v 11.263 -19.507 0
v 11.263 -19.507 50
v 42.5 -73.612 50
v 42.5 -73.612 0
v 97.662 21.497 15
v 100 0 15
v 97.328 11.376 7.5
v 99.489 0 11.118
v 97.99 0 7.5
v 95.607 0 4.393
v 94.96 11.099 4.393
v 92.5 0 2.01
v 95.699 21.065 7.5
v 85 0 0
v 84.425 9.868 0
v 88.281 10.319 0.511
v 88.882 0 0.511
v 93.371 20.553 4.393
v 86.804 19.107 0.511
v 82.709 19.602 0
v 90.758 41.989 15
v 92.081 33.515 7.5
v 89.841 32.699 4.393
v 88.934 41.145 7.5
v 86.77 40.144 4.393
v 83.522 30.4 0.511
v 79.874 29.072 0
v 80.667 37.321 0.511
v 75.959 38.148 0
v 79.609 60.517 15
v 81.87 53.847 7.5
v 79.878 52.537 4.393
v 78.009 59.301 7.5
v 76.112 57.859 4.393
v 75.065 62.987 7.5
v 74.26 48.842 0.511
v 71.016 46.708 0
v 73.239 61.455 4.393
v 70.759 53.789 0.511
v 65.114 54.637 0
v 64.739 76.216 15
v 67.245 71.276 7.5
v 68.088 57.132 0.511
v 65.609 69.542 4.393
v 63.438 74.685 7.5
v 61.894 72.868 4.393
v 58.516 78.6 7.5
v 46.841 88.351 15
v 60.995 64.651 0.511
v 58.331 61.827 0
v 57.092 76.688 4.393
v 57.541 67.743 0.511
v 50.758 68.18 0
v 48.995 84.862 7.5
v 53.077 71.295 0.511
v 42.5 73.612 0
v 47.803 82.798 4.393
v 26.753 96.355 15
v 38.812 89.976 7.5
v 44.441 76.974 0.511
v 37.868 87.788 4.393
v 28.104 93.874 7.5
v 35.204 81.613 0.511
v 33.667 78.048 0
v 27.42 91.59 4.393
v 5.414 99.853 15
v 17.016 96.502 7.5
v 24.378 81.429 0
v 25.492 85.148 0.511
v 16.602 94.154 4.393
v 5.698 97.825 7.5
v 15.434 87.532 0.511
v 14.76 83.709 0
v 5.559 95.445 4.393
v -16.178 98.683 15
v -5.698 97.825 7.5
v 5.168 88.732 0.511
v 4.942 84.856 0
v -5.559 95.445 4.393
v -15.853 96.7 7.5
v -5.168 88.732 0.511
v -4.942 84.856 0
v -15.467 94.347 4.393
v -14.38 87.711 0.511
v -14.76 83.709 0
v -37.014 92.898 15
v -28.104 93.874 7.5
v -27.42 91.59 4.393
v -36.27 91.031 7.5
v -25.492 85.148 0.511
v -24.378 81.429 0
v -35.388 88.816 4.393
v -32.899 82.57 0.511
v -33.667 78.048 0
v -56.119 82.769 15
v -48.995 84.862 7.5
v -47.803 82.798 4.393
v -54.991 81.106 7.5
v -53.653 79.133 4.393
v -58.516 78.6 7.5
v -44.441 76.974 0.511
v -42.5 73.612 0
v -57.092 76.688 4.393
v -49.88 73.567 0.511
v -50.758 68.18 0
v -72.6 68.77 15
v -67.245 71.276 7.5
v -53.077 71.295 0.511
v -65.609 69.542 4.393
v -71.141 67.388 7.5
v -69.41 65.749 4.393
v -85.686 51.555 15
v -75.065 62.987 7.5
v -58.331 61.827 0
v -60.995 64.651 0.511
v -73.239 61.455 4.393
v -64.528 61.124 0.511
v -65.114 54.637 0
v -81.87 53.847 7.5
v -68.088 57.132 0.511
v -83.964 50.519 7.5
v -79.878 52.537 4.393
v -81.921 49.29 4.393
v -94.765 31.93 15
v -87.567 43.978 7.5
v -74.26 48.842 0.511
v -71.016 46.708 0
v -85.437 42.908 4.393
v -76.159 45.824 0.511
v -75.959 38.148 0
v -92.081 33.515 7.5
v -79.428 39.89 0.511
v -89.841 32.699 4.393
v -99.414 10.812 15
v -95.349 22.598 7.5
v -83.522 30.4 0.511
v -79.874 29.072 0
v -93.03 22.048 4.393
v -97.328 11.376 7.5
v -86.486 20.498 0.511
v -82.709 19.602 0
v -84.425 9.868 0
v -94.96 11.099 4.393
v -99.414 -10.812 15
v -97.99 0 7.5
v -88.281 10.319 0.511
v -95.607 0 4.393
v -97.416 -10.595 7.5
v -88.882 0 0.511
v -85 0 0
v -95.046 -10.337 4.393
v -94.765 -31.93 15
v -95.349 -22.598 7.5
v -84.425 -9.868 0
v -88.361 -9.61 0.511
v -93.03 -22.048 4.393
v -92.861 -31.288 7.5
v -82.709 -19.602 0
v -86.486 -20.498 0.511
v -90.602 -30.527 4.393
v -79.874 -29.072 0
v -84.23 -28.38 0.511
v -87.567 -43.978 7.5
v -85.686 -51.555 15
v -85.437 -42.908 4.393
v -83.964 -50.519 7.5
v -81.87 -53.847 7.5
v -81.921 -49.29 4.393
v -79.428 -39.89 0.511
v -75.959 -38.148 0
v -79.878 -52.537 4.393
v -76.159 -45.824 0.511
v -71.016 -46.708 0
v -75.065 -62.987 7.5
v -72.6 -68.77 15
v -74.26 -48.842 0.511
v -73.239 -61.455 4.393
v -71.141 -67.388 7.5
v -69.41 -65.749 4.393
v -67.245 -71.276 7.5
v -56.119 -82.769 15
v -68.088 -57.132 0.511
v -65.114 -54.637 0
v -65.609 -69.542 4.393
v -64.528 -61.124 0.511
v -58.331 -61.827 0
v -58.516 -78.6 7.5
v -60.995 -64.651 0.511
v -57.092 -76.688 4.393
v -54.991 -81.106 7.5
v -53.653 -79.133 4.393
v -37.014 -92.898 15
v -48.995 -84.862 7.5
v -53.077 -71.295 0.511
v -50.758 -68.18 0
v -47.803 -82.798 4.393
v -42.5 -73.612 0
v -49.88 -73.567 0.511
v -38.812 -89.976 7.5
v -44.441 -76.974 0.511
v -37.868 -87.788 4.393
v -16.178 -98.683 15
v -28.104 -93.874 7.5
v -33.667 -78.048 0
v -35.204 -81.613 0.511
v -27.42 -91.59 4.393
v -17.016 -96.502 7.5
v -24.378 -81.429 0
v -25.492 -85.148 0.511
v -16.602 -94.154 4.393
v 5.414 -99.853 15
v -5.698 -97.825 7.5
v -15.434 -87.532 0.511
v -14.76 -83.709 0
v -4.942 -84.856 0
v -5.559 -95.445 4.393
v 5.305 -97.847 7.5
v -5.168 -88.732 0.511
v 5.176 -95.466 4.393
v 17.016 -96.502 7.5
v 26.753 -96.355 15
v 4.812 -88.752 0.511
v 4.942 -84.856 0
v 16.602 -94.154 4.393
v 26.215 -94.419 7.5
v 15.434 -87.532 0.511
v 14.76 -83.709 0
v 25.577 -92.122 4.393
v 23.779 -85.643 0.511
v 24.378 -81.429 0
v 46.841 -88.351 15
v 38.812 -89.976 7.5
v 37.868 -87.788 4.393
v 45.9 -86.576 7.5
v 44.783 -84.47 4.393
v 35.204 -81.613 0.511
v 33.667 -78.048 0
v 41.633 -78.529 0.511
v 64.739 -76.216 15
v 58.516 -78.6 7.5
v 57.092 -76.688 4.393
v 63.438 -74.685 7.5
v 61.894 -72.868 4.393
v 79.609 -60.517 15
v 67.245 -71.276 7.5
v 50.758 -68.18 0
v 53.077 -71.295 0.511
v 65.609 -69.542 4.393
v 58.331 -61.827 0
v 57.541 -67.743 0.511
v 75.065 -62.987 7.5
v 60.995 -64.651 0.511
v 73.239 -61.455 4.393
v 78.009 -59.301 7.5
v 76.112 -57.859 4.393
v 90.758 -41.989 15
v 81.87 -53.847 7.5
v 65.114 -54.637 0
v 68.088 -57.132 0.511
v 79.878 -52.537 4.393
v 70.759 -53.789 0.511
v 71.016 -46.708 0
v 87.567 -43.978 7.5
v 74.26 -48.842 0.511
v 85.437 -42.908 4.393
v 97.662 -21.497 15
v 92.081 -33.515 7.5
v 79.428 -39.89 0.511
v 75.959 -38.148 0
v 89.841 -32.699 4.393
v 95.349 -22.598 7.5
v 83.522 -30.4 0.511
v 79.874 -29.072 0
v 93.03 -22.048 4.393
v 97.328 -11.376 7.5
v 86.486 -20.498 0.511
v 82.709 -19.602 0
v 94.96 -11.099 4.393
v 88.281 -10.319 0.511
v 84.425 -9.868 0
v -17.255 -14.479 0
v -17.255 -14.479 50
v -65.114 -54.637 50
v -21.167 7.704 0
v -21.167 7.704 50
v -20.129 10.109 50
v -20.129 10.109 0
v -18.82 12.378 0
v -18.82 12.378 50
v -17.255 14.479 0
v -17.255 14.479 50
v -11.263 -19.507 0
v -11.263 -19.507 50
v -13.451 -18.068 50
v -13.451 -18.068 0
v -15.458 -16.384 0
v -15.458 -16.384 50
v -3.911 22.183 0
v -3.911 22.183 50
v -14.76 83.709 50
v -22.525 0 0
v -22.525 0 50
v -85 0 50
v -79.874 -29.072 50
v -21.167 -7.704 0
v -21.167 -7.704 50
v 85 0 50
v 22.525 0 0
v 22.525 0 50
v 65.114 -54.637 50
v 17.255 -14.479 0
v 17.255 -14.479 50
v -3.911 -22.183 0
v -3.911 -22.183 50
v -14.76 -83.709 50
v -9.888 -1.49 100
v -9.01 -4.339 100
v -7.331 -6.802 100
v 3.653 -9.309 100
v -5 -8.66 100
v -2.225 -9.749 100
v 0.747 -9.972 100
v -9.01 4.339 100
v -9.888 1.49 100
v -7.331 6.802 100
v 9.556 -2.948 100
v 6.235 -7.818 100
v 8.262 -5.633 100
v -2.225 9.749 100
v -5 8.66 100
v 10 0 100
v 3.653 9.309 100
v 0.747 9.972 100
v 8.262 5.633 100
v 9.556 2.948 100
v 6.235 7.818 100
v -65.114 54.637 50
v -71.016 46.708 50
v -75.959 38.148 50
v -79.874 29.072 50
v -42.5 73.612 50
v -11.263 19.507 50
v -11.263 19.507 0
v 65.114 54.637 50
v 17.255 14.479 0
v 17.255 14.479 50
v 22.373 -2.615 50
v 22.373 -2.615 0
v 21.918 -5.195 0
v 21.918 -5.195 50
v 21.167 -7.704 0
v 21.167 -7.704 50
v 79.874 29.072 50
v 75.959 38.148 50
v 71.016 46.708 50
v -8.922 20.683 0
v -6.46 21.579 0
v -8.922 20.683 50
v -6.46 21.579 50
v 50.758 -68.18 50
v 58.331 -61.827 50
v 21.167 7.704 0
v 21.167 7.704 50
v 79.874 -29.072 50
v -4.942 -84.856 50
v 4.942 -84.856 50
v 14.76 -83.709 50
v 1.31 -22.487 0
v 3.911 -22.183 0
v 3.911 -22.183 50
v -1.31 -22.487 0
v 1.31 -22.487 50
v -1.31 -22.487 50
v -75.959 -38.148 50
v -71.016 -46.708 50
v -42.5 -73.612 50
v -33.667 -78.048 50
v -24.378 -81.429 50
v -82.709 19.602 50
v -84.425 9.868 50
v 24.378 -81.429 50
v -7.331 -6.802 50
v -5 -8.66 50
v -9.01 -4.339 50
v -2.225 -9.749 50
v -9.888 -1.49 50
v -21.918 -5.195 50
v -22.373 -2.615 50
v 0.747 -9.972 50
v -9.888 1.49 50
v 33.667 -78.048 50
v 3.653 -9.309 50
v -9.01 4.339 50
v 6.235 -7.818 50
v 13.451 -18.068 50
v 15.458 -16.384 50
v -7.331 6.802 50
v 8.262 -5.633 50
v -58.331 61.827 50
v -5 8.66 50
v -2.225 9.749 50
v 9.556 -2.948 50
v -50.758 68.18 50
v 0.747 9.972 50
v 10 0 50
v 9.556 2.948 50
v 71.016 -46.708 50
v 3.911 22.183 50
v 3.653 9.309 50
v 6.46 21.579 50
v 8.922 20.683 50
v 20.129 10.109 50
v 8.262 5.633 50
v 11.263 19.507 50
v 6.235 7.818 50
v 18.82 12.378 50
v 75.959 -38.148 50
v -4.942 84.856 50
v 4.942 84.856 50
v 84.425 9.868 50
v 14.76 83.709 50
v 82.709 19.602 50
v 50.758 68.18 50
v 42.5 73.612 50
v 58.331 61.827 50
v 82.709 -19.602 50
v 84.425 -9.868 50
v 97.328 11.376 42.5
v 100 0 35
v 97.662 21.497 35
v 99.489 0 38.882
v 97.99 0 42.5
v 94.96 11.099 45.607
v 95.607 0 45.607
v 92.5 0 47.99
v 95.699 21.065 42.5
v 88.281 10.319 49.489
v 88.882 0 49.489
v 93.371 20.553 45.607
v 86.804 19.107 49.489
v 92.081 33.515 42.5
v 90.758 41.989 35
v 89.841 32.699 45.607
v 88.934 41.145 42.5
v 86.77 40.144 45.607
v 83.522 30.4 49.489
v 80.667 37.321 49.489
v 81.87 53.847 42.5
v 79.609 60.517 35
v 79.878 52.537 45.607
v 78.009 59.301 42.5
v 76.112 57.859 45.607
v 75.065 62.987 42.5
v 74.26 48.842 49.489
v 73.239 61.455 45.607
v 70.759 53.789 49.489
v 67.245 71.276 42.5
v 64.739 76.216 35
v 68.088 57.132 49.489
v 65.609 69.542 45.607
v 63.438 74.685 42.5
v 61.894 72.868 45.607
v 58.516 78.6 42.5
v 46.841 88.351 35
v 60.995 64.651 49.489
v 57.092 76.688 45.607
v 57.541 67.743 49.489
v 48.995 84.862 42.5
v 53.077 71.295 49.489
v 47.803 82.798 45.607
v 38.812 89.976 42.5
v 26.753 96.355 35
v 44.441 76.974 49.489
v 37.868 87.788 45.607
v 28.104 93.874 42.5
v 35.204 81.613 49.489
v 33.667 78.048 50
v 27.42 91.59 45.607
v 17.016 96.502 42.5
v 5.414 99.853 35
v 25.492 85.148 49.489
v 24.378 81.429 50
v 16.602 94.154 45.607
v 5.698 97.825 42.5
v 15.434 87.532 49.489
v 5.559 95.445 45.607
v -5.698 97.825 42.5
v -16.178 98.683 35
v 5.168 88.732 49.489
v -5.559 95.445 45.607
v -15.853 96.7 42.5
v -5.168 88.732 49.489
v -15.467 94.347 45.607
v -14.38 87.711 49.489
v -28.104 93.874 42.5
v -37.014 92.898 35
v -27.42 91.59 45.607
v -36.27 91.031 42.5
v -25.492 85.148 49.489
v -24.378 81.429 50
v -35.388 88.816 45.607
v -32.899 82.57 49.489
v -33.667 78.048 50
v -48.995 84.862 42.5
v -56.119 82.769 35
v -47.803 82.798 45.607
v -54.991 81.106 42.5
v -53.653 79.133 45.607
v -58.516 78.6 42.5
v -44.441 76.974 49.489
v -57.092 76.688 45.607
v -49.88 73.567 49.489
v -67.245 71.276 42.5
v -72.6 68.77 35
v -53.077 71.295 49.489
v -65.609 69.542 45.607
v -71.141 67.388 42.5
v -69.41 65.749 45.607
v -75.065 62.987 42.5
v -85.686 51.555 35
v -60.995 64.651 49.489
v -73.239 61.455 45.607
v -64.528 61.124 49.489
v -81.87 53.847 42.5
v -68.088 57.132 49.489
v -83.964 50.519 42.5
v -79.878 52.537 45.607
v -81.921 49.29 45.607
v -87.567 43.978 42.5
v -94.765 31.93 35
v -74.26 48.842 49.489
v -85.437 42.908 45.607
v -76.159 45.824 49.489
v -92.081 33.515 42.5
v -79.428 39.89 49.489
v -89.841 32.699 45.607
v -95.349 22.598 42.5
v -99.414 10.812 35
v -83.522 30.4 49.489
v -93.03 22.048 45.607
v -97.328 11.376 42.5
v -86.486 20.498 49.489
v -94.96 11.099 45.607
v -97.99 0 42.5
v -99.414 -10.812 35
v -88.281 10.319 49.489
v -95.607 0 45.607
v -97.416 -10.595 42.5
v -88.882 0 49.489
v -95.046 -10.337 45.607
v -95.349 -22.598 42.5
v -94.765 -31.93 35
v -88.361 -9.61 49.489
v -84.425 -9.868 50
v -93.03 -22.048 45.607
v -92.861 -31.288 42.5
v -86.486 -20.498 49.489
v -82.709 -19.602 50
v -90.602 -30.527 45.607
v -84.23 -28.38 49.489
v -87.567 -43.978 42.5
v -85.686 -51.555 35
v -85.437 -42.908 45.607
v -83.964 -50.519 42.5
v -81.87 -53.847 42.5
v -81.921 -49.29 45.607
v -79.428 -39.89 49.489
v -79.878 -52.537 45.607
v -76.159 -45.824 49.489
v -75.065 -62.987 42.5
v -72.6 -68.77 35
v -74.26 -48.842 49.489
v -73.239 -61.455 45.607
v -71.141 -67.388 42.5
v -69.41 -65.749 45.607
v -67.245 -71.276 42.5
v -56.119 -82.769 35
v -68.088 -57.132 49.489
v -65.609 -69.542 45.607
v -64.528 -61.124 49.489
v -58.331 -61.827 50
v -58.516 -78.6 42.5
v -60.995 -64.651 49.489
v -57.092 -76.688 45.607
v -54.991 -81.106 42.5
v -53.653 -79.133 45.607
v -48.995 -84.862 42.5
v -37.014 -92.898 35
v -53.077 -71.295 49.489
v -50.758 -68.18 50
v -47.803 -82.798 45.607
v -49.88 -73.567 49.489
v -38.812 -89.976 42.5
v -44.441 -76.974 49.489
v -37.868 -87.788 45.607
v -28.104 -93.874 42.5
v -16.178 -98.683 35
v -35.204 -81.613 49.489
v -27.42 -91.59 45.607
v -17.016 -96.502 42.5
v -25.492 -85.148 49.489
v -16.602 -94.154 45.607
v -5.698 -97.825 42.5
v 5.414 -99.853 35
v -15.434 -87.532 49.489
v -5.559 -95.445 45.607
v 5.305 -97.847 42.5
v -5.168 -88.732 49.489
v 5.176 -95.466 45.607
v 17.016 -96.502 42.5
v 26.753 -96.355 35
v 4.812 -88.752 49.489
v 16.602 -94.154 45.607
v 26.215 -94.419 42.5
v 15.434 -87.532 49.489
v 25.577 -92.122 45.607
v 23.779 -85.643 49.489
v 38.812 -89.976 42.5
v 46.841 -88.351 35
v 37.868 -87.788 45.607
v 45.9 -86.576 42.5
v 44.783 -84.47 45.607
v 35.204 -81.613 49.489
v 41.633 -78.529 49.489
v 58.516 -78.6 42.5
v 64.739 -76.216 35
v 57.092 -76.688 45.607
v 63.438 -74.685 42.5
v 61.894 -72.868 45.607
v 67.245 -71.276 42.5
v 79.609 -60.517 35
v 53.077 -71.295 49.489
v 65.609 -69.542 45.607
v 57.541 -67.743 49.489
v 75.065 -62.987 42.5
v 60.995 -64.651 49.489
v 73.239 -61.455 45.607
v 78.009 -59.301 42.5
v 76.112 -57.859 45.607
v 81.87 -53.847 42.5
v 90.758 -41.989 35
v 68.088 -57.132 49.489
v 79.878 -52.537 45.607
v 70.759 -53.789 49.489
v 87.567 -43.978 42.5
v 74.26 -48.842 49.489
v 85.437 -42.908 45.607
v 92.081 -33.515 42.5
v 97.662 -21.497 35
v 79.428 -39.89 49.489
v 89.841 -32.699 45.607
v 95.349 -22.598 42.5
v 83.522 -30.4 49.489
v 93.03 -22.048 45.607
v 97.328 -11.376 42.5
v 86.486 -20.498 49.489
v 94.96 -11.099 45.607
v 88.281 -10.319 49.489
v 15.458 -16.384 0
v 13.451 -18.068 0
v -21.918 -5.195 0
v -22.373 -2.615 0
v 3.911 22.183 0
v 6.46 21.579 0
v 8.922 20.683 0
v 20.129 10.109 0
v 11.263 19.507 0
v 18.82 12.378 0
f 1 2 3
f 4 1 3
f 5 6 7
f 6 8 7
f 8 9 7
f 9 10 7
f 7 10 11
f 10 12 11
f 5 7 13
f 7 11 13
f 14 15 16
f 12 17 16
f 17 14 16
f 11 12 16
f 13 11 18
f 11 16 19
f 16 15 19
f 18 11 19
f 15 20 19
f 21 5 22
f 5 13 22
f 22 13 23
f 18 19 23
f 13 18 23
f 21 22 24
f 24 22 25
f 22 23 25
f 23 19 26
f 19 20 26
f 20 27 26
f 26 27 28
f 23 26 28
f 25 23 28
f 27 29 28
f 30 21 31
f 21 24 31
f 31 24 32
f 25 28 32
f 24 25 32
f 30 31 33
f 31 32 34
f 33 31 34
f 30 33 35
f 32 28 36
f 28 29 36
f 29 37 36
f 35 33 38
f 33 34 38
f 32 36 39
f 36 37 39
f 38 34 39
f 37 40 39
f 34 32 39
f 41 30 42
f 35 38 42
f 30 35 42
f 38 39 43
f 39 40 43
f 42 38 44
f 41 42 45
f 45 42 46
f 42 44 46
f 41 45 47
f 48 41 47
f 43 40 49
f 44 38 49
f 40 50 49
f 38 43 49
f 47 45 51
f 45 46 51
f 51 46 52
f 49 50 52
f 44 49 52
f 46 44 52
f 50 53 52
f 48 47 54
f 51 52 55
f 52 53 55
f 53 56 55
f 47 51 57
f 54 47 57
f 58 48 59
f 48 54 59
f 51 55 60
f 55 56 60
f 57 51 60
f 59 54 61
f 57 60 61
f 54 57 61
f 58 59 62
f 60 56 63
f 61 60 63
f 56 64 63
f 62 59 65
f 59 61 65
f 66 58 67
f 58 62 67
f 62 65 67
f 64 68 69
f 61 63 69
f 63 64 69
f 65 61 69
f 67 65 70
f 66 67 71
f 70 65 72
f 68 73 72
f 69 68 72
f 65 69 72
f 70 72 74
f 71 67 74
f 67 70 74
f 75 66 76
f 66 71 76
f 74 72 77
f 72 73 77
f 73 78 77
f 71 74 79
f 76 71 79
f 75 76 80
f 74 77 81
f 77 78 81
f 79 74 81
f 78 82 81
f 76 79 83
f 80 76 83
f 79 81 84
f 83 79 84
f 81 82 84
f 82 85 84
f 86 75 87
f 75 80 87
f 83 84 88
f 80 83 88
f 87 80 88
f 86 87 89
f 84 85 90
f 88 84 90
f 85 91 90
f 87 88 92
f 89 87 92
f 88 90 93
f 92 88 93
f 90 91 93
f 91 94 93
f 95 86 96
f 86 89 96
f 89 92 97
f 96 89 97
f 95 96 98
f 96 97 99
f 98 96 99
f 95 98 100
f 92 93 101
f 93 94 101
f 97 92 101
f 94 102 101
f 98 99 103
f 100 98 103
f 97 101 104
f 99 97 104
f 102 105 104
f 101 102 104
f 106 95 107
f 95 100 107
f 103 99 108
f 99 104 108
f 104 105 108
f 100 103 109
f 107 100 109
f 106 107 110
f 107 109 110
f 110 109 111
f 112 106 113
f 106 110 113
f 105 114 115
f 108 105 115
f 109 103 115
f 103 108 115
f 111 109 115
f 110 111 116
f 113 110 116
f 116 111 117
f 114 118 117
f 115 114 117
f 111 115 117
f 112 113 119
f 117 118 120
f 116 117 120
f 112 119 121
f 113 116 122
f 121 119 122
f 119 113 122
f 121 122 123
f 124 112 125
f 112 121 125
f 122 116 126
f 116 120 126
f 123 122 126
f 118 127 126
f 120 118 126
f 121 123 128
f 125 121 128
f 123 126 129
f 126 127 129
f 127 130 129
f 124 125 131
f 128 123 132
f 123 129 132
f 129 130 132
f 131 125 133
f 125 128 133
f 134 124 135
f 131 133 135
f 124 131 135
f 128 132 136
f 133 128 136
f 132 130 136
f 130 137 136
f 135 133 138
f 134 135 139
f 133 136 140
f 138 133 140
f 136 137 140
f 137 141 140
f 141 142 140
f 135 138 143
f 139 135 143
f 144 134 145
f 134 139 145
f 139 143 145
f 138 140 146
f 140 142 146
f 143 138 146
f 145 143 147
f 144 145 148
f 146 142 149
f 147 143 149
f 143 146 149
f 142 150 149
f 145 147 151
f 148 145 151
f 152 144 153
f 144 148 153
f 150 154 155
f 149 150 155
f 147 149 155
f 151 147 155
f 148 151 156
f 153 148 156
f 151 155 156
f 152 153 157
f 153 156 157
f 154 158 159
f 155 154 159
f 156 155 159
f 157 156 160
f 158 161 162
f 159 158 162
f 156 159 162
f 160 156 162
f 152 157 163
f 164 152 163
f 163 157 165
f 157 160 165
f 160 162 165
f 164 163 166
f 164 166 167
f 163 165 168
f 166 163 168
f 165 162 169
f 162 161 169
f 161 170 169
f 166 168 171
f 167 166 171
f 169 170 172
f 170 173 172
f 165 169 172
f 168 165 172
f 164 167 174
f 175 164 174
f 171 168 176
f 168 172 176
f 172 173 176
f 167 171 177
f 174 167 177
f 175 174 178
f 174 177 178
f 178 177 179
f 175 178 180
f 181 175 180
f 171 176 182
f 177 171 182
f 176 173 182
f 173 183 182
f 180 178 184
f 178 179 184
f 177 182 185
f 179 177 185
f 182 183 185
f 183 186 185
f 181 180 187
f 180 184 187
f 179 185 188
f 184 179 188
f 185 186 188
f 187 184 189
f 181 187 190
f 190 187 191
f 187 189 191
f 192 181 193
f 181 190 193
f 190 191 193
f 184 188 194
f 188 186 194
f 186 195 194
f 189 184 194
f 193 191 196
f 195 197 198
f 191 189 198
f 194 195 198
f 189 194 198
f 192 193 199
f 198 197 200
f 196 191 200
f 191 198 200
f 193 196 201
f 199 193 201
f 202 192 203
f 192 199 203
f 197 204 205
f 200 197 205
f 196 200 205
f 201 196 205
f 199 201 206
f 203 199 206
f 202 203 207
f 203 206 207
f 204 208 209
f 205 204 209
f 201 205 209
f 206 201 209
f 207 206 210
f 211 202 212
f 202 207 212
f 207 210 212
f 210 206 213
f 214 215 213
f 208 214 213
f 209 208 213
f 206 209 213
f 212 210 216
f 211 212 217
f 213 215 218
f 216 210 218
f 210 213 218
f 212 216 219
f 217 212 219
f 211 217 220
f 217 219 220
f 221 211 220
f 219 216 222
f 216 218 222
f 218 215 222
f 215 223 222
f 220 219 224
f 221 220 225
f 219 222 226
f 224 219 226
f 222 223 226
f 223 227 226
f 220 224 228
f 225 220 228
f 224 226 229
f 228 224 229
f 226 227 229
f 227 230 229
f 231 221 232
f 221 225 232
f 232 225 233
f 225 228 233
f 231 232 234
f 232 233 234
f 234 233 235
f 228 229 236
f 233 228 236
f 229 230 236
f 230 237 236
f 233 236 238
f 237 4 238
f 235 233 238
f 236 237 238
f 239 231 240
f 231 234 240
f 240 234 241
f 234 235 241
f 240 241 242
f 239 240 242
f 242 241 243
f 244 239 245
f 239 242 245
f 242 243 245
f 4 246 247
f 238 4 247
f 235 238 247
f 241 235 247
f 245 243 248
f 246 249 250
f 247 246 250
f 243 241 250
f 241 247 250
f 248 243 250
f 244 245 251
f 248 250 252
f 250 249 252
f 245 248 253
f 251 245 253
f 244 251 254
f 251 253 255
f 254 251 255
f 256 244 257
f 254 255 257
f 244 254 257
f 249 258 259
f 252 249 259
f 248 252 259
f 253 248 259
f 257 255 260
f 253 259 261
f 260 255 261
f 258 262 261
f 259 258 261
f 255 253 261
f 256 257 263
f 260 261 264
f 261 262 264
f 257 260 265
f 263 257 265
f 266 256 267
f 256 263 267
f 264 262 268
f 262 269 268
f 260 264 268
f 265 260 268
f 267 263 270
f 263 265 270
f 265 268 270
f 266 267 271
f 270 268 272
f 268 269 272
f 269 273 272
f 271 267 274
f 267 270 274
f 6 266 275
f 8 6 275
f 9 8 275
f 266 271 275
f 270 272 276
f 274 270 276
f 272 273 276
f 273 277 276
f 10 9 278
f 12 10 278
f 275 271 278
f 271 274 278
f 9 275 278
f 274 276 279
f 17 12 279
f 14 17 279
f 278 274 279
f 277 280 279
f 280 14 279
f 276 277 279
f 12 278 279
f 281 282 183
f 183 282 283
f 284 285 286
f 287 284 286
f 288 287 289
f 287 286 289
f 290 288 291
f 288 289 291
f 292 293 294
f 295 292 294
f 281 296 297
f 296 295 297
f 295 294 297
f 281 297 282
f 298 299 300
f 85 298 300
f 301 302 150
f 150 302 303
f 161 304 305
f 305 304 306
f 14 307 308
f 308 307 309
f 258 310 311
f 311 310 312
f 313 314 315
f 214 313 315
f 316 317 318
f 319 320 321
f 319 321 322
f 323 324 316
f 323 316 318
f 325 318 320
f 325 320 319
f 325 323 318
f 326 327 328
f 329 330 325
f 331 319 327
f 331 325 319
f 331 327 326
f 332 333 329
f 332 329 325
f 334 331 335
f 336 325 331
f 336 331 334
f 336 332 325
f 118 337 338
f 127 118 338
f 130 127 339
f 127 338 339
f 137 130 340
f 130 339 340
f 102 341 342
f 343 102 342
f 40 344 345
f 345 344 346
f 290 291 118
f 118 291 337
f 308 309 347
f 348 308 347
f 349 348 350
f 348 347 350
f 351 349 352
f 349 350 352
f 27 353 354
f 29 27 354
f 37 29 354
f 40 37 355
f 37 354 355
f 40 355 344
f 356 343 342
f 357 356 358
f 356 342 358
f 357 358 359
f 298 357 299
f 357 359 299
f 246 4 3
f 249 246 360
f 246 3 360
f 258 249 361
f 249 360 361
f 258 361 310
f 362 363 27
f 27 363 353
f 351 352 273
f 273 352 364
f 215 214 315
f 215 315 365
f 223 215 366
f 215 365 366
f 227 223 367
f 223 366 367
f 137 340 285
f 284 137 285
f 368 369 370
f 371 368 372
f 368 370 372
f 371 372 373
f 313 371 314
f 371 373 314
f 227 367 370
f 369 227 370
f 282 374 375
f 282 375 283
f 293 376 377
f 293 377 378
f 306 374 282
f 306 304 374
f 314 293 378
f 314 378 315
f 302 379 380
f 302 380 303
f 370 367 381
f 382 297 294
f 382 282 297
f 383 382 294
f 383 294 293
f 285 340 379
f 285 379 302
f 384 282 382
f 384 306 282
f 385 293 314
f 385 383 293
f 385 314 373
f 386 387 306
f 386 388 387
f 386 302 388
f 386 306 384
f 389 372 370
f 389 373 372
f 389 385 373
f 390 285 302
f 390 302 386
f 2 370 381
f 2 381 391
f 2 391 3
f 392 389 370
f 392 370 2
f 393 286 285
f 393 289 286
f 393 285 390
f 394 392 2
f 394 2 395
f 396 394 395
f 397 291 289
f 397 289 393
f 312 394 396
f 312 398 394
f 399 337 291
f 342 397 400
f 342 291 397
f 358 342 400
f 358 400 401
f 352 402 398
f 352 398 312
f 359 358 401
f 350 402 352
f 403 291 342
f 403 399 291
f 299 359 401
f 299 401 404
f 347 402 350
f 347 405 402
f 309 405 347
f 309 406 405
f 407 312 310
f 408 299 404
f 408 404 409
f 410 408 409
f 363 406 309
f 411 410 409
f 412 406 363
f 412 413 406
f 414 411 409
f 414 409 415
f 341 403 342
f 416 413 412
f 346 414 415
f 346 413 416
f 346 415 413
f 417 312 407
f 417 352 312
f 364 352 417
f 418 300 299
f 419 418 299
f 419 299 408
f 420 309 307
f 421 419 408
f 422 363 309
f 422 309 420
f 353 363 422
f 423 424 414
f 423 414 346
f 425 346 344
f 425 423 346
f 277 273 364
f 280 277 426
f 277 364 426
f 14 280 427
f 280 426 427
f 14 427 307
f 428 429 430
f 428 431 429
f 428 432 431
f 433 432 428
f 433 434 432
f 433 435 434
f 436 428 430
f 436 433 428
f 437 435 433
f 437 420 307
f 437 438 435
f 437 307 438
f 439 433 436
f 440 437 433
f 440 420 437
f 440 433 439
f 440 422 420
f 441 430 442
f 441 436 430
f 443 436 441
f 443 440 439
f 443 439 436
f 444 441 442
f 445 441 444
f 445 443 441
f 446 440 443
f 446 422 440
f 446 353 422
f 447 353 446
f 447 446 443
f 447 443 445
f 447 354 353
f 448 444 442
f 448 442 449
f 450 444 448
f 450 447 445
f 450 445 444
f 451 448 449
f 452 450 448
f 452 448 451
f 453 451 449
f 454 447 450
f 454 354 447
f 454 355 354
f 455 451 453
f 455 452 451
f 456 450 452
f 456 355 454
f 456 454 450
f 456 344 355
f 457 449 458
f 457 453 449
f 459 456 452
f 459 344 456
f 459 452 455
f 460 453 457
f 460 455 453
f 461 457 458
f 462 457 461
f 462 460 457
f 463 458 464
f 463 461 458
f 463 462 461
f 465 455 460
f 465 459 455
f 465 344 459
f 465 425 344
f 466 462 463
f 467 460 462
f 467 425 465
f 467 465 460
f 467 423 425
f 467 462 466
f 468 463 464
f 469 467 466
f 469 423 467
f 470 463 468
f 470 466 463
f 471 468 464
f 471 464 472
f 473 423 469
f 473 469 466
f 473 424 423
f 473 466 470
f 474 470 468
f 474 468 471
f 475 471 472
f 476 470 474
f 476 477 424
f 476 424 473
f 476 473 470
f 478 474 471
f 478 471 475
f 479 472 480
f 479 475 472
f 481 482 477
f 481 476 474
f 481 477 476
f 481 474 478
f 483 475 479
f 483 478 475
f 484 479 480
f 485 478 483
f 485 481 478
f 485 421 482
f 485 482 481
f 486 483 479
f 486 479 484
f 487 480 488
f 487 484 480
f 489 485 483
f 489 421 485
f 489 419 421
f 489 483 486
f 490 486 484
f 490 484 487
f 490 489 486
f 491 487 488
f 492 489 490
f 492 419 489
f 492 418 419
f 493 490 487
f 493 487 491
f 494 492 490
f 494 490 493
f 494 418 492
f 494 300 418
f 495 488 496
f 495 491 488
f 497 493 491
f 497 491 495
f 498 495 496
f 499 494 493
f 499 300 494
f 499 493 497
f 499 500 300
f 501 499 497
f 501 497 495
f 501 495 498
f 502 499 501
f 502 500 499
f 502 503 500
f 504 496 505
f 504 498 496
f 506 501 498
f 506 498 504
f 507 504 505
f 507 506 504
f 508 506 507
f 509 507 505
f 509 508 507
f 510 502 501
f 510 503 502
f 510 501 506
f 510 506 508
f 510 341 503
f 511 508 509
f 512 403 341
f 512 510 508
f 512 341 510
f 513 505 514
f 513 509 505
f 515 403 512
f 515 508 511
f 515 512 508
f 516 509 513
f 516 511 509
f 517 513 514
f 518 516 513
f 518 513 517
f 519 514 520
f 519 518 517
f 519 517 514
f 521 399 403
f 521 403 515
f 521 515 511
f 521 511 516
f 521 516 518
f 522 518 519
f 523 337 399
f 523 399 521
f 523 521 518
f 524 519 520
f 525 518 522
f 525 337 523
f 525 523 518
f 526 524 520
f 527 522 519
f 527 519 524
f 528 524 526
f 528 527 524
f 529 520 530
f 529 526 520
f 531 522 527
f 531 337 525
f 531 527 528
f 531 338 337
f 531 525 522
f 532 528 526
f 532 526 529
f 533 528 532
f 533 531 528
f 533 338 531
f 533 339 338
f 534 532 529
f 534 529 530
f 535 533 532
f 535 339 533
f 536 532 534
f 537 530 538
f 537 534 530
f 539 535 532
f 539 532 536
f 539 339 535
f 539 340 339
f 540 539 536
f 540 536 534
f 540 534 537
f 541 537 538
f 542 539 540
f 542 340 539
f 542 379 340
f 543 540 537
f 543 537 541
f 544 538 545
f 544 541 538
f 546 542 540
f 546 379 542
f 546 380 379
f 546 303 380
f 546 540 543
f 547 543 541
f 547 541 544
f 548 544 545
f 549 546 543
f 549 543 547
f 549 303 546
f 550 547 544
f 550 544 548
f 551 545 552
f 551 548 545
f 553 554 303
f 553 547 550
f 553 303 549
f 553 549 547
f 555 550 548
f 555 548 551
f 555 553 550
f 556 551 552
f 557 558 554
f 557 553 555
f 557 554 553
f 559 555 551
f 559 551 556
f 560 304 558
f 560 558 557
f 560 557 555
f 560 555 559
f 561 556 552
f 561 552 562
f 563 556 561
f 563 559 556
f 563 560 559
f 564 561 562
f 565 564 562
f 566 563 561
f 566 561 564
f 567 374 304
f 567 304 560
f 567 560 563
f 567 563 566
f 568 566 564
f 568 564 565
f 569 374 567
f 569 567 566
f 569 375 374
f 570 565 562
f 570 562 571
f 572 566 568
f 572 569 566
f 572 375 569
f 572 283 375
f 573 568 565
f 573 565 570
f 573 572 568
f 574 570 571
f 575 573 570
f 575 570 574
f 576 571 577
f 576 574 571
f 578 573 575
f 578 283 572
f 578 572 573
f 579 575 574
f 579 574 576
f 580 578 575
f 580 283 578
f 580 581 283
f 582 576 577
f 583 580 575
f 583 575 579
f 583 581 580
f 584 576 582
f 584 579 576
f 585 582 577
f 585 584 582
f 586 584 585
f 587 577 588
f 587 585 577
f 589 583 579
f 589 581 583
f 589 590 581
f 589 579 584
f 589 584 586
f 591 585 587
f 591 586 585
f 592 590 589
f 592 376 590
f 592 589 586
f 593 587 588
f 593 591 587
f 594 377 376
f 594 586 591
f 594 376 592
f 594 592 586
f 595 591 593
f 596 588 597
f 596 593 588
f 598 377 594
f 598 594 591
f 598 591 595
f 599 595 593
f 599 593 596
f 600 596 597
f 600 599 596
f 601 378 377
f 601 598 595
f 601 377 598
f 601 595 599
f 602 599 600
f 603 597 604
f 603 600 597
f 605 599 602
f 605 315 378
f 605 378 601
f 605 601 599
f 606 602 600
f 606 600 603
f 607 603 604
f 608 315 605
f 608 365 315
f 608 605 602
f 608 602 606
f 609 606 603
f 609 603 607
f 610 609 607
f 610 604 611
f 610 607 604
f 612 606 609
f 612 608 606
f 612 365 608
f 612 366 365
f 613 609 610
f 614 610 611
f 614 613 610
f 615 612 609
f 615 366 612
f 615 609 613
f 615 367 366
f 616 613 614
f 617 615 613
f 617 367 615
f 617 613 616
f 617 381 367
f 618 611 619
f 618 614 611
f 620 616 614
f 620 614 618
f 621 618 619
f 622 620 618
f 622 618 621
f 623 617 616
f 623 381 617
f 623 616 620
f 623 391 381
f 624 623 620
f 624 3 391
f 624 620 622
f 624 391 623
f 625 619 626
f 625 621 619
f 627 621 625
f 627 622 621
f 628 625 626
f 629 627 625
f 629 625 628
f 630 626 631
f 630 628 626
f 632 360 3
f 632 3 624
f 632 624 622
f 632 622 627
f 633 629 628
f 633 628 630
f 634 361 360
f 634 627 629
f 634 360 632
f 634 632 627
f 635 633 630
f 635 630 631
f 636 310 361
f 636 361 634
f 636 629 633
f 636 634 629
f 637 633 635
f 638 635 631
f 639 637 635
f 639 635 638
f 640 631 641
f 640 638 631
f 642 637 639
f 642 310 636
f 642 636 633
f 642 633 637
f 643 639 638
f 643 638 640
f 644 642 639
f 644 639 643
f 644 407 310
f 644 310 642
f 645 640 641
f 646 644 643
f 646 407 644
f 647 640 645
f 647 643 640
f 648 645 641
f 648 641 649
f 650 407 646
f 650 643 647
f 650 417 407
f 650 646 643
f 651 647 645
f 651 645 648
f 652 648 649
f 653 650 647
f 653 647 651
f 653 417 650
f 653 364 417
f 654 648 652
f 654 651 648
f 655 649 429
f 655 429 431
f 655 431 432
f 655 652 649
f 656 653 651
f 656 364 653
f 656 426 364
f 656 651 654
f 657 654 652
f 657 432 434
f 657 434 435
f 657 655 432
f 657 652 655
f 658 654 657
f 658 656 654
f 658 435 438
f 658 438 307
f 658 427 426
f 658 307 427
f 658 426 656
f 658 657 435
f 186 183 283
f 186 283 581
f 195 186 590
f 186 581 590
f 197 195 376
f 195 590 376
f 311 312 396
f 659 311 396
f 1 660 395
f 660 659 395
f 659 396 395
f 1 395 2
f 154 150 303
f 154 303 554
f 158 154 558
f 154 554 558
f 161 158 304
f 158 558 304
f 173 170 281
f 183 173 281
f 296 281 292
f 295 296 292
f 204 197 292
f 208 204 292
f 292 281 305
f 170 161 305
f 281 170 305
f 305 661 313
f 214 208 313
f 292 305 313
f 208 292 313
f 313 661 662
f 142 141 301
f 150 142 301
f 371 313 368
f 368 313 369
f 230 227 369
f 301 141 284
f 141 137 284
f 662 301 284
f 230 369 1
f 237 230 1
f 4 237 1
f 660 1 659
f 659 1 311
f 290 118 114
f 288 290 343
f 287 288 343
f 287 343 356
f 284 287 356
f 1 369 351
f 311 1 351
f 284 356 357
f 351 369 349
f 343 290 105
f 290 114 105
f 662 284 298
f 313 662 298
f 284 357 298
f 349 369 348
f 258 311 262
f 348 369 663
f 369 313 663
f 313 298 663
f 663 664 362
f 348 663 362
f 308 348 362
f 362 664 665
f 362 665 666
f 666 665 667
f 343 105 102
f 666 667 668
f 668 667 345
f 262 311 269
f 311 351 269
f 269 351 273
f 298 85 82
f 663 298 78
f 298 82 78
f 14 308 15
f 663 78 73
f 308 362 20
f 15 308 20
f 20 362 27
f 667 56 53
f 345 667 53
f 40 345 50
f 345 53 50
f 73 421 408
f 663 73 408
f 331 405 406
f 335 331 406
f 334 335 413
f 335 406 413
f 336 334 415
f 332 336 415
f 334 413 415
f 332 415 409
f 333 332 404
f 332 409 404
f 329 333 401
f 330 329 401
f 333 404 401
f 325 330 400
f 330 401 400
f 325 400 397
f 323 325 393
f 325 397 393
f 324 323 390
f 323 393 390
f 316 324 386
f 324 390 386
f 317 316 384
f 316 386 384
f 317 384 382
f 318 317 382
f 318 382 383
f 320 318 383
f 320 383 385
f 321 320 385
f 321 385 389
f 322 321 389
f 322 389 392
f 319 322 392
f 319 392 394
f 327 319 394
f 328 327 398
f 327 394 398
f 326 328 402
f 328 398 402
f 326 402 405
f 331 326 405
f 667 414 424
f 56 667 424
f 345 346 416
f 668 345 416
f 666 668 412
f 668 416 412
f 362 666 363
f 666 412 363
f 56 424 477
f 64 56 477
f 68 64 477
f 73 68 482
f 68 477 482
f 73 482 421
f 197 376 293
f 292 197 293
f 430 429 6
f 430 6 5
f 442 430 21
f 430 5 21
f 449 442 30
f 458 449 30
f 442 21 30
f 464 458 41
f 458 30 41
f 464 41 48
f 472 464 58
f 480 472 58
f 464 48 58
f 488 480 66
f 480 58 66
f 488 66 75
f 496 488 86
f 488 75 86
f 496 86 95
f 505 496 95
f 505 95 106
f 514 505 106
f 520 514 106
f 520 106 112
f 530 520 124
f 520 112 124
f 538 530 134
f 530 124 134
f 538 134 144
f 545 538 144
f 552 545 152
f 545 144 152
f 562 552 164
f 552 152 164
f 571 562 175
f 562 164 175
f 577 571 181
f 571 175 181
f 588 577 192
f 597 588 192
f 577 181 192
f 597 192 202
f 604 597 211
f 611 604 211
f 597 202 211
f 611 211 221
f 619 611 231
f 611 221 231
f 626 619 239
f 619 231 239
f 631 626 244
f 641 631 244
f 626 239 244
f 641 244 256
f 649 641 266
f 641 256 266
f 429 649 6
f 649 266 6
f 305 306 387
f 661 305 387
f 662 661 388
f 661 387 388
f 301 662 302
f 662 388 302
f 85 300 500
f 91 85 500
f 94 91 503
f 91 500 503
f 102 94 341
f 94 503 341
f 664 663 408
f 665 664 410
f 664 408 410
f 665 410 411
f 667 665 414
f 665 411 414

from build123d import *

# Parameters (mm, degrees)
SKETCH_1_R          = 100
EXTRUDE_1_DEPTH     = 50
SKETCH_2_R          = 10
EXTRUDE_2_DEPTH     = 50
FILLET_1_R          = 15
CUT_EXTRUDE_1_DEPTH = 151.000000067


with BuildPart() as part:
    # 草图1 → 凸台-拉伸1 (new body)
    with BuildSketch(Plane.XY):
        Circle(SKETCH_1_R)
    extrude(amount=EXTRUDE_1_DEPTH)

    # 草图2 → 凸台-拉伸2 (add)
    with BuildSketch(Plane.XY.offset(50)):
        Circle(SKETCH_2_R)
    extrude(amount=EXTRUDE_2_DEPTH)

    # 圆角1
    fillet_1_edges = [part.edges().sort_by_distance(p)[0] for p in [
        (-100, 0, 0),
        (-100, 0, 50),
    ]]
    fillet(fillet_1_edges, radius=FILLET_1_R)

    # 草图3 → 切除-拉伸1 (cut, through all)
    with BuildSketch(Plane.XY.offset(50)):
        with BuildLine():
            ThreePointArc((-11.262655322, 19.507491245), (-7.704109975, 21.166868192), (-3.911479145, 22.18310056))
            Line((-3.911479145, 22.18310056), (-14.760095102, 83.708659006))
            ThreePointArc((-14.760095102, 83.708659006), (-29.071712183, 79.873872767), (-42.5, 73.612159322))
            Line((-42.5, 73.612159322), (-11.262655322, 19.507491245))
        make_face()
        with BuildLine():
            Line((14.760095102, 83.708659006), (3.911479145, 22.18310056))
            ThreePointArc((3.911479145, 22.18310056), (7.704109975, 21.166868192), (11.262655322, 19.507491245))
            Line((11.262655322, 19.507491245), (42.5, 73.612159322))
            ThreePointArc((42.5, 73.612159322), (29.071712183, 79.873872767), (14.760095102, 83.708659006))
        make_face()
        with BuildLine():
            Line((65.113777665, 54.636946823), (17.255389048, 14.478990586))
            ThreePointArc((17.255389048, 14.478990586), (19.507491245, 11.262655322), (21.166868192, 7.704109975))
            Line((21.166868192, 7.704109975), (79.873872767, 29.071712183))
            ThreePointArc((79.873872767, 29.071712183), (73.612159322, 42.5), (65.113777665, 54.636946823))
        make_face()
        with BuildLine():
            Line((85, 0), (22.525310643, 0))
            ThreePointArc((22.525310643, 0), (22.18310056, -3.911479145), (21.166868192, -7.704109975))
            Line((21.166868192, -7.704109975), (79.873872767, -29.071712183))
            ThreePointArc((79.873872767, -29.071712183), (83.708659006, -14.760095102), (85, 0))
        make_face()
        with BuildLine():
            Line((65.113777665, -54.636946823), (17.255389048, -14.478990586))
            ThreePointArc((17.255389048, -14.478990586), (14.478990586, -17.255389048), (11.262655322, -19.507491245))
            Line((11.262655322, -19.507491245), (42.5, -73.612159322))
            ThreePointArc((42.5, -73.612159322), (54.636946823, -65.113777665), (65.113777665, -54.636946823))
        make_face()
        with BuildLine():
            Line((14.760095102, -83.708659006), (3.911479145, -22.18310056))
            ThreePointArc((3.911479145, -22.18310056), (0, -22.525310643), (-3.911479145, -22.18310056))
            Line((-3.911479145, -22.18310056), (-14.760095102, -83.708659006))
            ThreePointArc((-14.760095102, -83.708659006), (0, -85), (14.760095102, -83.708659006))
        make_face()
        with BuildLine():
            Line((-42.5, -73.612159322), (-11.262655322, -19.507491245))
            ThreePointArc((-11.262655322, -19.507491245), (-14.478990586, -17.255389048), (-17.255389048, -14.478990586))
            Line((-17.255389048, -14.478990586), (-65.113777665, -54.636946823))
            ThreePointArc((-65.113777665, -54.636946823), (-54.636946823, -65.113777665), (-42.5, -73.612159322))
        make_face()
        with BuildLine():
            Line((-79.873872767, -29.071712183), (-21.166868192, -7.704109975))
            ThreePointArc((-21.166868192, -7.704109975), (-22.18310056, -3.911479145), (-22.525310643, 0))
            Line((-22.525310643, 0), (-85, 0))
            ThreePointArc((-85, 0), (-83.708659006, -14.760095102), (-79.873872767, -29.071712183))
        make_face()
        with BuildLine():
            Line((-79.873872767, 29.071712183), (-21.166868192, 7.704109975))
            ThreePointArc((-21.166868192, 7.704109975), (-19.507491245, 11.262655322), (-17.255389048, 14.478990586))
            Line((-17.255389048, 14.478990586), (-65.113777665, 54.636946823))
            ThreePointArc((-65.113777665, 54.636946823), (-73.612159322, 42.5), (-79.873872767, 29.071712183))
        make_face()
    extrude(amount=-CUT_EXTRUDE_1_DEPTH, mode=Mode.SUBTRACT)


solid = part.part
